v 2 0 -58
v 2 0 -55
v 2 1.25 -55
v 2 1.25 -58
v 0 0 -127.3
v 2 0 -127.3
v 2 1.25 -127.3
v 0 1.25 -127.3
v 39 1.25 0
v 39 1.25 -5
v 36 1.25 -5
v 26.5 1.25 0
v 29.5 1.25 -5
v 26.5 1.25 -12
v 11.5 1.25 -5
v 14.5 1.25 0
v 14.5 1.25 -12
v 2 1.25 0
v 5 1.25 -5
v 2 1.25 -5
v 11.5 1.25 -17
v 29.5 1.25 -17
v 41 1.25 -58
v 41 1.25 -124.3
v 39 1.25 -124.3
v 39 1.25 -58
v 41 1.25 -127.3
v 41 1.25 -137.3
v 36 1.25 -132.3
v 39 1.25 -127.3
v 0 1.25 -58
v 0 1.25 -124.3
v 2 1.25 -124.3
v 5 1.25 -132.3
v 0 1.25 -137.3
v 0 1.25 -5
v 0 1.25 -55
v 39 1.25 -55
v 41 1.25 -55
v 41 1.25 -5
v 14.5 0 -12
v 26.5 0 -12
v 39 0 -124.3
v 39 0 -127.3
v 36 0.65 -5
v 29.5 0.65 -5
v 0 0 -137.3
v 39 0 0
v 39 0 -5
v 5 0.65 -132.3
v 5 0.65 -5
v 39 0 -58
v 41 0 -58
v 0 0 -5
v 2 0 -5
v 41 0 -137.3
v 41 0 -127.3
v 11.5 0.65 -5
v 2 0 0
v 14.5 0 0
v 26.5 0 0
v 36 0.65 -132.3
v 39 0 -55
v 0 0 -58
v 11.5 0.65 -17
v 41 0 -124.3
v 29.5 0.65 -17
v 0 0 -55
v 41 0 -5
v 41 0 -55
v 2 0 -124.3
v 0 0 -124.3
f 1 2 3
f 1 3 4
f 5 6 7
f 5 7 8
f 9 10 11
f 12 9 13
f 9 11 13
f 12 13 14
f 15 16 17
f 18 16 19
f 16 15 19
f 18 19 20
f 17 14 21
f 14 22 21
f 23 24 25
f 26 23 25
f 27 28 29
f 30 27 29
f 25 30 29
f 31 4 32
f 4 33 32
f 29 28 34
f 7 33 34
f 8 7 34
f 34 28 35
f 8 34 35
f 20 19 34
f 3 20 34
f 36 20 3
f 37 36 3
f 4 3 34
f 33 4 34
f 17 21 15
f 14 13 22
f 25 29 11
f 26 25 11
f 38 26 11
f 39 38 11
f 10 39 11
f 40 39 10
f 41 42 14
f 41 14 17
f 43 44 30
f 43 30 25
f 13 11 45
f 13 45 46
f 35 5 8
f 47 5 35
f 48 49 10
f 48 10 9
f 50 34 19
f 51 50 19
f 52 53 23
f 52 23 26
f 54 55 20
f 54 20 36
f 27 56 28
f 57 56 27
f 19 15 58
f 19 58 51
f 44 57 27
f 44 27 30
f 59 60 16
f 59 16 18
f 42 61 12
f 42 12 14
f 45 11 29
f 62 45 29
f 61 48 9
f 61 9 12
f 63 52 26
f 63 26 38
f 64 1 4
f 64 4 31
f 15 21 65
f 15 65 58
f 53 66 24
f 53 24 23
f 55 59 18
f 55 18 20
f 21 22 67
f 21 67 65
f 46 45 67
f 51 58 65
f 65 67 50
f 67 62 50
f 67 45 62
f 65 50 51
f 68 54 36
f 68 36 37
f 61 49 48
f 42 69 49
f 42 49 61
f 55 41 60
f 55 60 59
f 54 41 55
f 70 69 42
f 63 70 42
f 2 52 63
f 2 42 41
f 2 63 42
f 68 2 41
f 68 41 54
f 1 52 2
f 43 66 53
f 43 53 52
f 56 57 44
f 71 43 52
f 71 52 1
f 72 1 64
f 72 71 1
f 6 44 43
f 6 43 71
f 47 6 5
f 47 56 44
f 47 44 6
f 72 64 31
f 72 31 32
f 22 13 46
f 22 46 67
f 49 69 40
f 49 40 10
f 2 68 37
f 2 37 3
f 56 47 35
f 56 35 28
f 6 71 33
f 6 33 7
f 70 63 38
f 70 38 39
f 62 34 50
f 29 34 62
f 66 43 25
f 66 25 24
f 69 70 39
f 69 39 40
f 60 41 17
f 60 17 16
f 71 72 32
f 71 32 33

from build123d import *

# Parameters (mm, degrees)
BOSS_EXTRUDE1_DEPTH = 1.25
CUT_EXTRUDE1_DEPTH  = 0.6


with BuildPart() as part:
    # Sketch1 → Boss-Extrude1 (new body)
    with BuildSketch(Plane(origin=(0, 0, 0), x_dir=(1, 0, 0), z_dir=(0, 1, 0))):
        Polygon((0, 58), (0, 124.3), (2, 124.3), (2, 127.3), (0, 127.3), (0, 137.3), (41, 137.3), (41, 127.3), (39, 127.3), (39, 124.3), (41, 124.3), (41, 58), (39, 58), (39, 55), (41, 55), (41, 5), (39, 5), (39, 0), (26.5, 0), (26.5, 12), (14.5, 12), (14.5, 0), (2, 0), (2, 5), (0, 5), (0, 55), (2, 55), (2, 58), align=None)
    extrude(amount=BOSS_EXTRUDE1_DEPTH)

    # Sketch2 → Cut-Extrude1 (cut)
    with BuildSketch(Plane(origin=(0, 1.25, 0), x_dir=(1, 0, 0), z_dir=(0, 1, 0))):
        Polygon((5, 132.3), (36, 132.3), (36, 17), (36, 5), (29.5, 5), (29.5, 17), (11.5, 17), (11.5, 5), (5, 5), (5, 17), align=None)
    extrude(amount=-CUT_EXTRUDE1_DEPTH, mode=Mode.SUBTRACT)


solid = part.part
